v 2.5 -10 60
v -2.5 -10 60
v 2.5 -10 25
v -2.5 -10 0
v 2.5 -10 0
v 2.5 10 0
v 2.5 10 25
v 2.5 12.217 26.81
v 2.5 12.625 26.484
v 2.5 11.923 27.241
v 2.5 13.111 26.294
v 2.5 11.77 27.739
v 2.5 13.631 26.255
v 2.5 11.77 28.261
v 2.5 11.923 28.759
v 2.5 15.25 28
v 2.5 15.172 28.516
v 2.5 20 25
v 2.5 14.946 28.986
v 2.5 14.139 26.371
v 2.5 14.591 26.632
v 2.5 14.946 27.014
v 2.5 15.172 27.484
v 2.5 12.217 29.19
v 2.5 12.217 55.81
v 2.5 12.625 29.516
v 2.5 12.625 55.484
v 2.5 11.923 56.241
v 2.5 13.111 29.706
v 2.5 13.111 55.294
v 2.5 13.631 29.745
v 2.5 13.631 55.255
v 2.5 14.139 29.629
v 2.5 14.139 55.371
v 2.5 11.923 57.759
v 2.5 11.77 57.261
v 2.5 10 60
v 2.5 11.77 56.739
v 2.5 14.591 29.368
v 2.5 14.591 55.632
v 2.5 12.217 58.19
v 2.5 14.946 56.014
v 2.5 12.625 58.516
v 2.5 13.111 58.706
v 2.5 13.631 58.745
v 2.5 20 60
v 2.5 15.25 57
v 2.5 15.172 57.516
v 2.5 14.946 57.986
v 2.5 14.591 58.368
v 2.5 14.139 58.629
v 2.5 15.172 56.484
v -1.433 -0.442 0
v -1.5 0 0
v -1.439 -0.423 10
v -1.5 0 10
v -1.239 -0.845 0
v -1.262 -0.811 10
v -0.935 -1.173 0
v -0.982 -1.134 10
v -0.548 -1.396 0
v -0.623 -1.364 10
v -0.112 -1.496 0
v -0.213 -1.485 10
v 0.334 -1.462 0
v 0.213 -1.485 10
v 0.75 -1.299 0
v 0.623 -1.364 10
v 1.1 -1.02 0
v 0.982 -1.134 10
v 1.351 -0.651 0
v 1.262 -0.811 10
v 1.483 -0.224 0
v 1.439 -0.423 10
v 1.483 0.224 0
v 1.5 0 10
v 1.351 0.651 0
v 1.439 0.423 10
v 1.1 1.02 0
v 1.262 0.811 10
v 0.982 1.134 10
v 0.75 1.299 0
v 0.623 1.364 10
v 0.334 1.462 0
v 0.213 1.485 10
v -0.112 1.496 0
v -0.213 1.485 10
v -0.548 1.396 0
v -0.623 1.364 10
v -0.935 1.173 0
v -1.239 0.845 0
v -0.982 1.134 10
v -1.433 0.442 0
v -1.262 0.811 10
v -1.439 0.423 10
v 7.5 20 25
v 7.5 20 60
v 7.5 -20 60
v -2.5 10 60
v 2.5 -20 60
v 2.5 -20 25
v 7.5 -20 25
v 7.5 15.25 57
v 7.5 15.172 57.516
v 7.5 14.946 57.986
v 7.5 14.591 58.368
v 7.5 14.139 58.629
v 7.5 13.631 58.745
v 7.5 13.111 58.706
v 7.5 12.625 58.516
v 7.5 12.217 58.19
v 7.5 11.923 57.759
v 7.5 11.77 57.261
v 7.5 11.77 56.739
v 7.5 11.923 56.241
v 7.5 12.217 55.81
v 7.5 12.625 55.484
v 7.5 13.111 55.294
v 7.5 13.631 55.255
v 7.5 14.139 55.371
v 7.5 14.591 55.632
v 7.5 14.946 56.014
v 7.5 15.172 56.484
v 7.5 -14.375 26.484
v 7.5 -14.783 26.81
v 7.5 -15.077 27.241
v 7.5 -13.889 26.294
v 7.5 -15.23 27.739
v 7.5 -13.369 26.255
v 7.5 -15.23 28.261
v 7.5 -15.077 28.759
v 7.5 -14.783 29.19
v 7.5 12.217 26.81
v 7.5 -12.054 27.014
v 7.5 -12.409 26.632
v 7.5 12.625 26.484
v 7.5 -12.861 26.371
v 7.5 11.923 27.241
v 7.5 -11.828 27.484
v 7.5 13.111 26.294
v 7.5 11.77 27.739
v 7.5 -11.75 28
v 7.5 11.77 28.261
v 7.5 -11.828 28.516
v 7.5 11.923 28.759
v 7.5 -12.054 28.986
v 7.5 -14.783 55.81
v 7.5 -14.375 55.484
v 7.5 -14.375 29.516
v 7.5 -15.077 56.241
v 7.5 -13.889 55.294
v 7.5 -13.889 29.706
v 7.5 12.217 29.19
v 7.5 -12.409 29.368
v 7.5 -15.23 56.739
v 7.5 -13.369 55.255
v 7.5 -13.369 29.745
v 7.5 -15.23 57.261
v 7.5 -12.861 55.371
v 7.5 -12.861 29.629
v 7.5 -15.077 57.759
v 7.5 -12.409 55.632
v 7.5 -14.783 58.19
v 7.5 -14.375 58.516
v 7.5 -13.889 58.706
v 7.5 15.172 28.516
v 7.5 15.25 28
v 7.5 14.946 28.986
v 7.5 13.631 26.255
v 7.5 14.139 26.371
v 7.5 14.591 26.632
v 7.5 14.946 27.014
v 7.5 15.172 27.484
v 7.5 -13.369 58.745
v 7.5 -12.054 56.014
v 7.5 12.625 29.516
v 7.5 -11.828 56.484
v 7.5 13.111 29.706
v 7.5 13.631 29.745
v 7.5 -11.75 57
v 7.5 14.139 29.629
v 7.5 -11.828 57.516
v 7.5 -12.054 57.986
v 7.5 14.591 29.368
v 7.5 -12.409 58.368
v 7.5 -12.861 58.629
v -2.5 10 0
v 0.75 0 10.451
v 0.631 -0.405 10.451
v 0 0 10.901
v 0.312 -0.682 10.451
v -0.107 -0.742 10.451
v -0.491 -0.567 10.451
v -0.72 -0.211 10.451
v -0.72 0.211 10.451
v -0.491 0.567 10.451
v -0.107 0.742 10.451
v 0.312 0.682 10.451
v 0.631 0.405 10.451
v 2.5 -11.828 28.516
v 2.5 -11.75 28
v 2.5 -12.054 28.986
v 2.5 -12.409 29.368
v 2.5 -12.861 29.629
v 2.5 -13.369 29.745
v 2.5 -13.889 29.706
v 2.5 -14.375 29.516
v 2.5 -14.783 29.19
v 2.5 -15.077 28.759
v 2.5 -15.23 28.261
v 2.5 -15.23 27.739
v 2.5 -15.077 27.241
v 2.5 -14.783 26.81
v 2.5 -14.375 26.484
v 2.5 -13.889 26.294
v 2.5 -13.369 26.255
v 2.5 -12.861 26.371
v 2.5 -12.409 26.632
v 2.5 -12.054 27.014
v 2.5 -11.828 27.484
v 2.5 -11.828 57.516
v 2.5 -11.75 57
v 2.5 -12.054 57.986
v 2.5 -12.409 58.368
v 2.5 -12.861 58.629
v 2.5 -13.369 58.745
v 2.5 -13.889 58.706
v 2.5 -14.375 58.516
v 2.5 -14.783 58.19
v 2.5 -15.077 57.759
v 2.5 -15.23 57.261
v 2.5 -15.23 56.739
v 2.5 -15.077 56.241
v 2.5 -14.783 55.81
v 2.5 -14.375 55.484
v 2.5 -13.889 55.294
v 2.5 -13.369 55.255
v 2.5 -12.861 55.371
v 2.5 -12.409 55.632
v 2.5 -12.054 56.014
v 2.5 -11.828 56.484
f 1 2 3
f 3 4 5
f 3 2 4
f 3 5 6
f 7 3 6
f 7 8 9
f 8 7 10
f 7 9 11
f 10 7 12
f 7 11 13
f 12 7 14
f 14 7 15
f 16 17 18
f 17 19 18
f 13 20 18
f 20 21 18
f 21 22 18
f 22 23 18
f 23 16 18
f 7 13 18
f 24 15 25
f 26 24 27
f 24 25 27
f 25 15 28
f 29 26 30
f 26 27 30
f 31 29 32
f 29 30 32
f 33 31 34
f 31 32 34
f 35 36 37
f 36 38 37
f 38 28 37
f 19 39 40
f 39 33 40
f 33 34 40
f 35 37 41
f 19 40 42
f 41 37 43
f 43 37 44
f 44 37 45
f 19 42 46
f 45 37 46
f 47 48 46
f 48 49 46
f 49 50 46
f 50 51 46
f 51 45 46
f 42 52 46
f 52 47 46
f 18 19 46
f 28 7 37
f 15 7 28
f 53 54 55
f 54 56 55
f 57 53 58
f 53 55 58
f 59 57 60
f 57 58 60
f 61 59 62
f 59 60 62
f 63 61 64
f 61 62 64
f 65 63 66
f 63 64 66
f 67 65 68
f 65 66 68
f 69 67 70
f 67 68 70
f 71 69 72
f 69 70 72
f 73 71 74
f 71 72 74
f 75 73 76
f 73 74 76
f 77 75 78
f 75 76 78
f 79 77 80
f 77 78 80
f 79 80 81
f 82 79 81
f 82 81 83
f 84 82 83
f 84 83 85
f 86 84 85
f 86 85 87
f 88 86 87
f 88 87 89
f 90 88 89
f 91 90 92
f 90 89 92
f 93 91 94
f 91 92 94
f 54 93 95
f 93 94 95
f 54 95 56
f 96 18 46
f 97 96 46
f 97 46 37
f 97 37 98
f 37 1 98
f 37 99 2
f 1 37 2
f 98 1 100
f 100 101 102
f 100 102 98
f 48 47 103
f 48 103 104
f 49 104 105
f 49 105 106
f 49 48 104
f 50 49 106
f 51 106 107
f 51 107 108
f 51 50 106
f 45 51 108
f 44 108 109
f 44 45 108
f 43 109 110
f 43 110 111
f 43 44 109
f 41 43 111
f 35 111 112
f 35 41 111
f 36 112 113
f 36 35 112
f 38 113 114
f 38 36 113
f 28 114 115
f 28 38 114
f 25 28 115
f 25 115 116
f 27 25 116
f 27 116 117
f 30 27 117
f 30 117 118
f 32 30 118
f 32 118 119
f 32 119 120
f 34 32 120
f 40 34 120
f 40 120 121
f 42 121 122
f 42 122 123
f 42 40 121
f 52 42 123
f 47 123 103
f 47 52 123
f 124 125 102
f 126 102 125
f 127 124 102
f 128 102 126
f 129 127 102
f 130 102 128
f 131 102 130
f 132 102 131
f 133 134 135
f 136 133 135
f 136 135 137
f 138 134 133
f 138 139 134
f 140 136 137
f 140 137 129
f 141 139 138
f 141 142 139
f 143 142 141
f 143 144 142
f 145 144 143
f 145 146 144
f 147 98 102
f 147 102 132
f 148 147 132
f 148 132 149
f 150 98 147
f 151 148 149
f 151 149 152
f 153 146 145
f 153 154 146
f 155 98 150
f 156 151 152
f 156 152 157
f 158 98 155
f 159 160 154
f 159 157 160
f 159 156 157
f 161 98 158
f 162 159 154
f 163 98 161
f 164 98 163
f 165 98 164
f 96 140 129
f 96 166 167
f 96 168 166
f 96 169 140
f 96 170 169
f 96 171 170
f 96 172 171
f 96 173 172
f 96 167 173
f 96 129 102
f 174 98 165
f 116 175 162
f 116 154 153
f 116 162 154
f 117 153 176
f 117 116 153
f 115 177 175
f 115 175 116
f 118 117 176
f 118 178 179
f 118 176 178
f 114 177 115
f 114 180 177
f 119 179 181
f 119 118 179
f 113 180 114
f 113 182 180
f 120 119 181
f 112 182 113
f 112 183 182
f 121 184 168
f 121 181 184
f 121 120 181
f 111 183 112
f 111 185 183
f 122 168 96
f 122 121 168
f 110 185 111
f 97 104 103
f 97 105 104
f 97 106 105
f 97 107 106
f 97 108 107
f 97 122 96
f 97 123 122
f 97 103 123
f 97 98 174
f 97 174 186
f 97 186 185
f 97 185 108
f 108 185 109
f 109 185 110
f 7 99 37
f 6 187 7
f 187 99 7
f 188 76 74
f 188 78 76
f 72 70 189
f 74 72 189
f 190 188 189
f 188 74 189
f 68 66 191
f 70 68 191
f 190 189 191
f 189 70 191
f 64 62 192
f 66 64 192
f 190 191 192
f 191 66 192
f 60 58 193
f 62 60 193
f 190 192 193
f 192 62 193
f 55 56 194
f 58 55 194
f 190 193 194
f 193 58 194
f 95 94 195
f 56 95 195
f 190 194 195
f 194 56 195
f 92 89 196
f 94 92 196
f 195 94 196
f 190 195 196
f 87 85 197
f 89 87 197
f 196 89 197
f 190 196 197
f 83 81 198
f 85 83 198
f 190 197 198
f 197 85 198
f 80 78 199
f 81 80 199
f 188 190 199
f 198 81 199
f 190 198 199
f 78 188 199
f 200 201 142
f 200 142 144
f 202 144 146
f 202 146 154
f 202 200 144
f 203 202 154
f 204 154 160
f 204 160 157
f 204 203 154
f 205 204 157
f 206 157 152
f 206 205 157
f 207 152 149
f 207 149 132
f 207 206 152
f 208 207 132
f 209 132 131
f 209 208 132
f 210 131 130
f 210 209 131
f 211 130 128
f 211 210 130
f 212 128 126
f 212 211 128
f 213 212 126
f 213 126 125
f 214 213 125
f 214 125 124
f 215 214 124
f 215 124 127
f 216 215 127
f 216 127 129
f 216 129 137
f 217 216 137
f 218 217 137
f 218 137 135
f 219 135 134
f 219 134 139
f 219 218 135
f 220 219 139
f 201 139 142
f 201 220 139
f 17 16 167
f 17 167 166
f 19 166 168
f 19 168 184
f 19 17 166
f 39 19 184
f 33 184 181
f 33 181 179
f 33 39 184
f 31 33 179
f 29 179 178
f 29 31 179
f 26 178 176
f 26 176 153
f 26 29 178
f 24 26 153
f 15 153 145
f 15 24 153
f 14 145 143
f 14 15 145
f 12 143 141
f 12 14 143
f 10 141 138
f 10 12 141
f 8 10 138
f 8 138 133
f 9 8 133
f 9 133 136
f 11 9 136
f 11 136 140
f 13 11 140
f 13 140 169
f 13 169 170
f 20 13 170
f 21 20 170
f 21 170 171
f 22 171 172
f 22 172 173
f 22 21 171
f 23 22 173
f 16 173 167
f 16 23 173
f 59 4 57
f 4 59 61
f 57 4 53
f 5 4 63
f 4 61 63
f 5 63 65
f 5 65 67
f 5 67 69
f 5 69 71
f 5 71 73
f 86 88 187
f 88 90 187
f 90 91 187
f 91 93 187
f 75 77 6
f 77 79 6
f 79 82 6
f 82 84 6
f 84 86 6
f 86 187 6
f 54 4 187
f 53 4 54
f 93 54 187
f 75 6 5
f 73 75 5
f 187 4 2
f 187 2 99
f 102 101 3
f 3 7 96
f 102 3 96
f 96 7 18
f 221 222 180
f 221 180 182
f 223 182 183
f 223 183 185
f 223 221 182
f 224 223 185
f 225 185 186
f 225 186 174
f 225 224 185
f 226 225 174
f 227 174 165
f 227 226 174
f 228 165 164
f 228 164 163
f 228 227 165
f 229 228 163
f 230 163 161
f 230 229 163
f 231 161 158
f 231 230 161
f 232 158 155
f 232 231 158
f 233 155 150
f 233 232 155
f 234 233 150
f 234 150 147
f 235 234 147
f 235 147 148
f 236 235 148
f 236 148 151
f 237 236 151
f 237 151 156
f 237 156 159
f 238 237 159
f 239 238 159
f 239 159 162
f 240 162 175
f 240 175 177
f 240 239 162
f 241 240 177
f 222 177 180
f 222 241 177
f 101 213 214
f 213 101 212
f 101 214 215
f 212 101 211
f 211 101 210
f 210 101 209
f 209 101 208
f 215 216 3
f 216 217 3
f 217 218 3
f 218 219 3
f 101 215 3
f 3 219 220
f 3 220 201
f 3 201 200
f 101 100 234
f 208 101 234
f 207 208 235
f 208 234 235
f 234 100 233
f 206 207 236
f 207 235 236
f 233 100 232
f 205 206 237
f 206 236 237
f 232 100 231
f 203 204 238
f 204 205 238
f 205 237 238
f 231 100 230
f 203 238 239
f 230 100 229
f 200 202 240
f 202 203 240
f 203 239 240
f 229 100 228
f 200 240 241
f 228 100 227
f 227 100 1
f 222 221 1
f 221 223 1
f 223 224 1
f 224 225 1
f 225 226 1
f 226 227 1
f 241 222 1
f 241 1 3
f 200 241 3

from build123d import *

# Parameters (mm, degrees)
F0_W     = 5
F0_H     = 20
F1_DEPTH = 60
F2_W     = 10
F2_H     = 35
F2_R     = 1.75
F2_W_2   = 20
F3_DEPTH = 5
F5_D     = 3
F5_DEPTH = 10
F5_TIP   = 0.9012909285


with BuildPart() as f1:
    # F0 (on Top) → F1 (new body)
    with BuildSketch(Plane.XY):
        Rectangle(F0_W, F0_H)
    extrude(amount=F1_DEPTH)

    # F2 (on face) → F3 (join)
    with BuildSketch(Plane.YZ.offset(2.5)):
        with Locations((15, 42.5)):
            Rectangle(F2_W, F2_H)
        with Locations((13.5, 28)):
            Circle(F2_R, mode=Mode.SUBTRACT)
        with Locations((13.5, 57)):
            Circle(F2_R, mode=Mode.SUBTRACT)
        with Locations((-15, 42.5)):
            Rectangle(F2_W, F2_H)
        with Locations((-13.5, 28)):
            Circle(F2_R, mode=Mode.SUBTRACT)
        with Locations((-13.5, 57)):
            Circle(F2_R, mode=Mode.SUBTRACT)
        with Locations((0, 42.5)):
            Rectangle(F2_W_2, F2_H)
    extrude(amount=F3_DEPTH)

    # F5
    with Locations(Plane(origin=(0, 0, 0), x_dir=(1, 0, 0), z_dir=(0, 0, -1))):
        with Locations((0, 0)):
            Hole(F5_D / 2, depth=F5_DEPTH)
            with Locations((0, 0, -(F5_DEPTH + F5_TIP / 2))):  # 118° drill point
                Cone(0, F5_D / 2, F5_TIP, mode=Mode.SUBTRACT)


solid = f1.part
